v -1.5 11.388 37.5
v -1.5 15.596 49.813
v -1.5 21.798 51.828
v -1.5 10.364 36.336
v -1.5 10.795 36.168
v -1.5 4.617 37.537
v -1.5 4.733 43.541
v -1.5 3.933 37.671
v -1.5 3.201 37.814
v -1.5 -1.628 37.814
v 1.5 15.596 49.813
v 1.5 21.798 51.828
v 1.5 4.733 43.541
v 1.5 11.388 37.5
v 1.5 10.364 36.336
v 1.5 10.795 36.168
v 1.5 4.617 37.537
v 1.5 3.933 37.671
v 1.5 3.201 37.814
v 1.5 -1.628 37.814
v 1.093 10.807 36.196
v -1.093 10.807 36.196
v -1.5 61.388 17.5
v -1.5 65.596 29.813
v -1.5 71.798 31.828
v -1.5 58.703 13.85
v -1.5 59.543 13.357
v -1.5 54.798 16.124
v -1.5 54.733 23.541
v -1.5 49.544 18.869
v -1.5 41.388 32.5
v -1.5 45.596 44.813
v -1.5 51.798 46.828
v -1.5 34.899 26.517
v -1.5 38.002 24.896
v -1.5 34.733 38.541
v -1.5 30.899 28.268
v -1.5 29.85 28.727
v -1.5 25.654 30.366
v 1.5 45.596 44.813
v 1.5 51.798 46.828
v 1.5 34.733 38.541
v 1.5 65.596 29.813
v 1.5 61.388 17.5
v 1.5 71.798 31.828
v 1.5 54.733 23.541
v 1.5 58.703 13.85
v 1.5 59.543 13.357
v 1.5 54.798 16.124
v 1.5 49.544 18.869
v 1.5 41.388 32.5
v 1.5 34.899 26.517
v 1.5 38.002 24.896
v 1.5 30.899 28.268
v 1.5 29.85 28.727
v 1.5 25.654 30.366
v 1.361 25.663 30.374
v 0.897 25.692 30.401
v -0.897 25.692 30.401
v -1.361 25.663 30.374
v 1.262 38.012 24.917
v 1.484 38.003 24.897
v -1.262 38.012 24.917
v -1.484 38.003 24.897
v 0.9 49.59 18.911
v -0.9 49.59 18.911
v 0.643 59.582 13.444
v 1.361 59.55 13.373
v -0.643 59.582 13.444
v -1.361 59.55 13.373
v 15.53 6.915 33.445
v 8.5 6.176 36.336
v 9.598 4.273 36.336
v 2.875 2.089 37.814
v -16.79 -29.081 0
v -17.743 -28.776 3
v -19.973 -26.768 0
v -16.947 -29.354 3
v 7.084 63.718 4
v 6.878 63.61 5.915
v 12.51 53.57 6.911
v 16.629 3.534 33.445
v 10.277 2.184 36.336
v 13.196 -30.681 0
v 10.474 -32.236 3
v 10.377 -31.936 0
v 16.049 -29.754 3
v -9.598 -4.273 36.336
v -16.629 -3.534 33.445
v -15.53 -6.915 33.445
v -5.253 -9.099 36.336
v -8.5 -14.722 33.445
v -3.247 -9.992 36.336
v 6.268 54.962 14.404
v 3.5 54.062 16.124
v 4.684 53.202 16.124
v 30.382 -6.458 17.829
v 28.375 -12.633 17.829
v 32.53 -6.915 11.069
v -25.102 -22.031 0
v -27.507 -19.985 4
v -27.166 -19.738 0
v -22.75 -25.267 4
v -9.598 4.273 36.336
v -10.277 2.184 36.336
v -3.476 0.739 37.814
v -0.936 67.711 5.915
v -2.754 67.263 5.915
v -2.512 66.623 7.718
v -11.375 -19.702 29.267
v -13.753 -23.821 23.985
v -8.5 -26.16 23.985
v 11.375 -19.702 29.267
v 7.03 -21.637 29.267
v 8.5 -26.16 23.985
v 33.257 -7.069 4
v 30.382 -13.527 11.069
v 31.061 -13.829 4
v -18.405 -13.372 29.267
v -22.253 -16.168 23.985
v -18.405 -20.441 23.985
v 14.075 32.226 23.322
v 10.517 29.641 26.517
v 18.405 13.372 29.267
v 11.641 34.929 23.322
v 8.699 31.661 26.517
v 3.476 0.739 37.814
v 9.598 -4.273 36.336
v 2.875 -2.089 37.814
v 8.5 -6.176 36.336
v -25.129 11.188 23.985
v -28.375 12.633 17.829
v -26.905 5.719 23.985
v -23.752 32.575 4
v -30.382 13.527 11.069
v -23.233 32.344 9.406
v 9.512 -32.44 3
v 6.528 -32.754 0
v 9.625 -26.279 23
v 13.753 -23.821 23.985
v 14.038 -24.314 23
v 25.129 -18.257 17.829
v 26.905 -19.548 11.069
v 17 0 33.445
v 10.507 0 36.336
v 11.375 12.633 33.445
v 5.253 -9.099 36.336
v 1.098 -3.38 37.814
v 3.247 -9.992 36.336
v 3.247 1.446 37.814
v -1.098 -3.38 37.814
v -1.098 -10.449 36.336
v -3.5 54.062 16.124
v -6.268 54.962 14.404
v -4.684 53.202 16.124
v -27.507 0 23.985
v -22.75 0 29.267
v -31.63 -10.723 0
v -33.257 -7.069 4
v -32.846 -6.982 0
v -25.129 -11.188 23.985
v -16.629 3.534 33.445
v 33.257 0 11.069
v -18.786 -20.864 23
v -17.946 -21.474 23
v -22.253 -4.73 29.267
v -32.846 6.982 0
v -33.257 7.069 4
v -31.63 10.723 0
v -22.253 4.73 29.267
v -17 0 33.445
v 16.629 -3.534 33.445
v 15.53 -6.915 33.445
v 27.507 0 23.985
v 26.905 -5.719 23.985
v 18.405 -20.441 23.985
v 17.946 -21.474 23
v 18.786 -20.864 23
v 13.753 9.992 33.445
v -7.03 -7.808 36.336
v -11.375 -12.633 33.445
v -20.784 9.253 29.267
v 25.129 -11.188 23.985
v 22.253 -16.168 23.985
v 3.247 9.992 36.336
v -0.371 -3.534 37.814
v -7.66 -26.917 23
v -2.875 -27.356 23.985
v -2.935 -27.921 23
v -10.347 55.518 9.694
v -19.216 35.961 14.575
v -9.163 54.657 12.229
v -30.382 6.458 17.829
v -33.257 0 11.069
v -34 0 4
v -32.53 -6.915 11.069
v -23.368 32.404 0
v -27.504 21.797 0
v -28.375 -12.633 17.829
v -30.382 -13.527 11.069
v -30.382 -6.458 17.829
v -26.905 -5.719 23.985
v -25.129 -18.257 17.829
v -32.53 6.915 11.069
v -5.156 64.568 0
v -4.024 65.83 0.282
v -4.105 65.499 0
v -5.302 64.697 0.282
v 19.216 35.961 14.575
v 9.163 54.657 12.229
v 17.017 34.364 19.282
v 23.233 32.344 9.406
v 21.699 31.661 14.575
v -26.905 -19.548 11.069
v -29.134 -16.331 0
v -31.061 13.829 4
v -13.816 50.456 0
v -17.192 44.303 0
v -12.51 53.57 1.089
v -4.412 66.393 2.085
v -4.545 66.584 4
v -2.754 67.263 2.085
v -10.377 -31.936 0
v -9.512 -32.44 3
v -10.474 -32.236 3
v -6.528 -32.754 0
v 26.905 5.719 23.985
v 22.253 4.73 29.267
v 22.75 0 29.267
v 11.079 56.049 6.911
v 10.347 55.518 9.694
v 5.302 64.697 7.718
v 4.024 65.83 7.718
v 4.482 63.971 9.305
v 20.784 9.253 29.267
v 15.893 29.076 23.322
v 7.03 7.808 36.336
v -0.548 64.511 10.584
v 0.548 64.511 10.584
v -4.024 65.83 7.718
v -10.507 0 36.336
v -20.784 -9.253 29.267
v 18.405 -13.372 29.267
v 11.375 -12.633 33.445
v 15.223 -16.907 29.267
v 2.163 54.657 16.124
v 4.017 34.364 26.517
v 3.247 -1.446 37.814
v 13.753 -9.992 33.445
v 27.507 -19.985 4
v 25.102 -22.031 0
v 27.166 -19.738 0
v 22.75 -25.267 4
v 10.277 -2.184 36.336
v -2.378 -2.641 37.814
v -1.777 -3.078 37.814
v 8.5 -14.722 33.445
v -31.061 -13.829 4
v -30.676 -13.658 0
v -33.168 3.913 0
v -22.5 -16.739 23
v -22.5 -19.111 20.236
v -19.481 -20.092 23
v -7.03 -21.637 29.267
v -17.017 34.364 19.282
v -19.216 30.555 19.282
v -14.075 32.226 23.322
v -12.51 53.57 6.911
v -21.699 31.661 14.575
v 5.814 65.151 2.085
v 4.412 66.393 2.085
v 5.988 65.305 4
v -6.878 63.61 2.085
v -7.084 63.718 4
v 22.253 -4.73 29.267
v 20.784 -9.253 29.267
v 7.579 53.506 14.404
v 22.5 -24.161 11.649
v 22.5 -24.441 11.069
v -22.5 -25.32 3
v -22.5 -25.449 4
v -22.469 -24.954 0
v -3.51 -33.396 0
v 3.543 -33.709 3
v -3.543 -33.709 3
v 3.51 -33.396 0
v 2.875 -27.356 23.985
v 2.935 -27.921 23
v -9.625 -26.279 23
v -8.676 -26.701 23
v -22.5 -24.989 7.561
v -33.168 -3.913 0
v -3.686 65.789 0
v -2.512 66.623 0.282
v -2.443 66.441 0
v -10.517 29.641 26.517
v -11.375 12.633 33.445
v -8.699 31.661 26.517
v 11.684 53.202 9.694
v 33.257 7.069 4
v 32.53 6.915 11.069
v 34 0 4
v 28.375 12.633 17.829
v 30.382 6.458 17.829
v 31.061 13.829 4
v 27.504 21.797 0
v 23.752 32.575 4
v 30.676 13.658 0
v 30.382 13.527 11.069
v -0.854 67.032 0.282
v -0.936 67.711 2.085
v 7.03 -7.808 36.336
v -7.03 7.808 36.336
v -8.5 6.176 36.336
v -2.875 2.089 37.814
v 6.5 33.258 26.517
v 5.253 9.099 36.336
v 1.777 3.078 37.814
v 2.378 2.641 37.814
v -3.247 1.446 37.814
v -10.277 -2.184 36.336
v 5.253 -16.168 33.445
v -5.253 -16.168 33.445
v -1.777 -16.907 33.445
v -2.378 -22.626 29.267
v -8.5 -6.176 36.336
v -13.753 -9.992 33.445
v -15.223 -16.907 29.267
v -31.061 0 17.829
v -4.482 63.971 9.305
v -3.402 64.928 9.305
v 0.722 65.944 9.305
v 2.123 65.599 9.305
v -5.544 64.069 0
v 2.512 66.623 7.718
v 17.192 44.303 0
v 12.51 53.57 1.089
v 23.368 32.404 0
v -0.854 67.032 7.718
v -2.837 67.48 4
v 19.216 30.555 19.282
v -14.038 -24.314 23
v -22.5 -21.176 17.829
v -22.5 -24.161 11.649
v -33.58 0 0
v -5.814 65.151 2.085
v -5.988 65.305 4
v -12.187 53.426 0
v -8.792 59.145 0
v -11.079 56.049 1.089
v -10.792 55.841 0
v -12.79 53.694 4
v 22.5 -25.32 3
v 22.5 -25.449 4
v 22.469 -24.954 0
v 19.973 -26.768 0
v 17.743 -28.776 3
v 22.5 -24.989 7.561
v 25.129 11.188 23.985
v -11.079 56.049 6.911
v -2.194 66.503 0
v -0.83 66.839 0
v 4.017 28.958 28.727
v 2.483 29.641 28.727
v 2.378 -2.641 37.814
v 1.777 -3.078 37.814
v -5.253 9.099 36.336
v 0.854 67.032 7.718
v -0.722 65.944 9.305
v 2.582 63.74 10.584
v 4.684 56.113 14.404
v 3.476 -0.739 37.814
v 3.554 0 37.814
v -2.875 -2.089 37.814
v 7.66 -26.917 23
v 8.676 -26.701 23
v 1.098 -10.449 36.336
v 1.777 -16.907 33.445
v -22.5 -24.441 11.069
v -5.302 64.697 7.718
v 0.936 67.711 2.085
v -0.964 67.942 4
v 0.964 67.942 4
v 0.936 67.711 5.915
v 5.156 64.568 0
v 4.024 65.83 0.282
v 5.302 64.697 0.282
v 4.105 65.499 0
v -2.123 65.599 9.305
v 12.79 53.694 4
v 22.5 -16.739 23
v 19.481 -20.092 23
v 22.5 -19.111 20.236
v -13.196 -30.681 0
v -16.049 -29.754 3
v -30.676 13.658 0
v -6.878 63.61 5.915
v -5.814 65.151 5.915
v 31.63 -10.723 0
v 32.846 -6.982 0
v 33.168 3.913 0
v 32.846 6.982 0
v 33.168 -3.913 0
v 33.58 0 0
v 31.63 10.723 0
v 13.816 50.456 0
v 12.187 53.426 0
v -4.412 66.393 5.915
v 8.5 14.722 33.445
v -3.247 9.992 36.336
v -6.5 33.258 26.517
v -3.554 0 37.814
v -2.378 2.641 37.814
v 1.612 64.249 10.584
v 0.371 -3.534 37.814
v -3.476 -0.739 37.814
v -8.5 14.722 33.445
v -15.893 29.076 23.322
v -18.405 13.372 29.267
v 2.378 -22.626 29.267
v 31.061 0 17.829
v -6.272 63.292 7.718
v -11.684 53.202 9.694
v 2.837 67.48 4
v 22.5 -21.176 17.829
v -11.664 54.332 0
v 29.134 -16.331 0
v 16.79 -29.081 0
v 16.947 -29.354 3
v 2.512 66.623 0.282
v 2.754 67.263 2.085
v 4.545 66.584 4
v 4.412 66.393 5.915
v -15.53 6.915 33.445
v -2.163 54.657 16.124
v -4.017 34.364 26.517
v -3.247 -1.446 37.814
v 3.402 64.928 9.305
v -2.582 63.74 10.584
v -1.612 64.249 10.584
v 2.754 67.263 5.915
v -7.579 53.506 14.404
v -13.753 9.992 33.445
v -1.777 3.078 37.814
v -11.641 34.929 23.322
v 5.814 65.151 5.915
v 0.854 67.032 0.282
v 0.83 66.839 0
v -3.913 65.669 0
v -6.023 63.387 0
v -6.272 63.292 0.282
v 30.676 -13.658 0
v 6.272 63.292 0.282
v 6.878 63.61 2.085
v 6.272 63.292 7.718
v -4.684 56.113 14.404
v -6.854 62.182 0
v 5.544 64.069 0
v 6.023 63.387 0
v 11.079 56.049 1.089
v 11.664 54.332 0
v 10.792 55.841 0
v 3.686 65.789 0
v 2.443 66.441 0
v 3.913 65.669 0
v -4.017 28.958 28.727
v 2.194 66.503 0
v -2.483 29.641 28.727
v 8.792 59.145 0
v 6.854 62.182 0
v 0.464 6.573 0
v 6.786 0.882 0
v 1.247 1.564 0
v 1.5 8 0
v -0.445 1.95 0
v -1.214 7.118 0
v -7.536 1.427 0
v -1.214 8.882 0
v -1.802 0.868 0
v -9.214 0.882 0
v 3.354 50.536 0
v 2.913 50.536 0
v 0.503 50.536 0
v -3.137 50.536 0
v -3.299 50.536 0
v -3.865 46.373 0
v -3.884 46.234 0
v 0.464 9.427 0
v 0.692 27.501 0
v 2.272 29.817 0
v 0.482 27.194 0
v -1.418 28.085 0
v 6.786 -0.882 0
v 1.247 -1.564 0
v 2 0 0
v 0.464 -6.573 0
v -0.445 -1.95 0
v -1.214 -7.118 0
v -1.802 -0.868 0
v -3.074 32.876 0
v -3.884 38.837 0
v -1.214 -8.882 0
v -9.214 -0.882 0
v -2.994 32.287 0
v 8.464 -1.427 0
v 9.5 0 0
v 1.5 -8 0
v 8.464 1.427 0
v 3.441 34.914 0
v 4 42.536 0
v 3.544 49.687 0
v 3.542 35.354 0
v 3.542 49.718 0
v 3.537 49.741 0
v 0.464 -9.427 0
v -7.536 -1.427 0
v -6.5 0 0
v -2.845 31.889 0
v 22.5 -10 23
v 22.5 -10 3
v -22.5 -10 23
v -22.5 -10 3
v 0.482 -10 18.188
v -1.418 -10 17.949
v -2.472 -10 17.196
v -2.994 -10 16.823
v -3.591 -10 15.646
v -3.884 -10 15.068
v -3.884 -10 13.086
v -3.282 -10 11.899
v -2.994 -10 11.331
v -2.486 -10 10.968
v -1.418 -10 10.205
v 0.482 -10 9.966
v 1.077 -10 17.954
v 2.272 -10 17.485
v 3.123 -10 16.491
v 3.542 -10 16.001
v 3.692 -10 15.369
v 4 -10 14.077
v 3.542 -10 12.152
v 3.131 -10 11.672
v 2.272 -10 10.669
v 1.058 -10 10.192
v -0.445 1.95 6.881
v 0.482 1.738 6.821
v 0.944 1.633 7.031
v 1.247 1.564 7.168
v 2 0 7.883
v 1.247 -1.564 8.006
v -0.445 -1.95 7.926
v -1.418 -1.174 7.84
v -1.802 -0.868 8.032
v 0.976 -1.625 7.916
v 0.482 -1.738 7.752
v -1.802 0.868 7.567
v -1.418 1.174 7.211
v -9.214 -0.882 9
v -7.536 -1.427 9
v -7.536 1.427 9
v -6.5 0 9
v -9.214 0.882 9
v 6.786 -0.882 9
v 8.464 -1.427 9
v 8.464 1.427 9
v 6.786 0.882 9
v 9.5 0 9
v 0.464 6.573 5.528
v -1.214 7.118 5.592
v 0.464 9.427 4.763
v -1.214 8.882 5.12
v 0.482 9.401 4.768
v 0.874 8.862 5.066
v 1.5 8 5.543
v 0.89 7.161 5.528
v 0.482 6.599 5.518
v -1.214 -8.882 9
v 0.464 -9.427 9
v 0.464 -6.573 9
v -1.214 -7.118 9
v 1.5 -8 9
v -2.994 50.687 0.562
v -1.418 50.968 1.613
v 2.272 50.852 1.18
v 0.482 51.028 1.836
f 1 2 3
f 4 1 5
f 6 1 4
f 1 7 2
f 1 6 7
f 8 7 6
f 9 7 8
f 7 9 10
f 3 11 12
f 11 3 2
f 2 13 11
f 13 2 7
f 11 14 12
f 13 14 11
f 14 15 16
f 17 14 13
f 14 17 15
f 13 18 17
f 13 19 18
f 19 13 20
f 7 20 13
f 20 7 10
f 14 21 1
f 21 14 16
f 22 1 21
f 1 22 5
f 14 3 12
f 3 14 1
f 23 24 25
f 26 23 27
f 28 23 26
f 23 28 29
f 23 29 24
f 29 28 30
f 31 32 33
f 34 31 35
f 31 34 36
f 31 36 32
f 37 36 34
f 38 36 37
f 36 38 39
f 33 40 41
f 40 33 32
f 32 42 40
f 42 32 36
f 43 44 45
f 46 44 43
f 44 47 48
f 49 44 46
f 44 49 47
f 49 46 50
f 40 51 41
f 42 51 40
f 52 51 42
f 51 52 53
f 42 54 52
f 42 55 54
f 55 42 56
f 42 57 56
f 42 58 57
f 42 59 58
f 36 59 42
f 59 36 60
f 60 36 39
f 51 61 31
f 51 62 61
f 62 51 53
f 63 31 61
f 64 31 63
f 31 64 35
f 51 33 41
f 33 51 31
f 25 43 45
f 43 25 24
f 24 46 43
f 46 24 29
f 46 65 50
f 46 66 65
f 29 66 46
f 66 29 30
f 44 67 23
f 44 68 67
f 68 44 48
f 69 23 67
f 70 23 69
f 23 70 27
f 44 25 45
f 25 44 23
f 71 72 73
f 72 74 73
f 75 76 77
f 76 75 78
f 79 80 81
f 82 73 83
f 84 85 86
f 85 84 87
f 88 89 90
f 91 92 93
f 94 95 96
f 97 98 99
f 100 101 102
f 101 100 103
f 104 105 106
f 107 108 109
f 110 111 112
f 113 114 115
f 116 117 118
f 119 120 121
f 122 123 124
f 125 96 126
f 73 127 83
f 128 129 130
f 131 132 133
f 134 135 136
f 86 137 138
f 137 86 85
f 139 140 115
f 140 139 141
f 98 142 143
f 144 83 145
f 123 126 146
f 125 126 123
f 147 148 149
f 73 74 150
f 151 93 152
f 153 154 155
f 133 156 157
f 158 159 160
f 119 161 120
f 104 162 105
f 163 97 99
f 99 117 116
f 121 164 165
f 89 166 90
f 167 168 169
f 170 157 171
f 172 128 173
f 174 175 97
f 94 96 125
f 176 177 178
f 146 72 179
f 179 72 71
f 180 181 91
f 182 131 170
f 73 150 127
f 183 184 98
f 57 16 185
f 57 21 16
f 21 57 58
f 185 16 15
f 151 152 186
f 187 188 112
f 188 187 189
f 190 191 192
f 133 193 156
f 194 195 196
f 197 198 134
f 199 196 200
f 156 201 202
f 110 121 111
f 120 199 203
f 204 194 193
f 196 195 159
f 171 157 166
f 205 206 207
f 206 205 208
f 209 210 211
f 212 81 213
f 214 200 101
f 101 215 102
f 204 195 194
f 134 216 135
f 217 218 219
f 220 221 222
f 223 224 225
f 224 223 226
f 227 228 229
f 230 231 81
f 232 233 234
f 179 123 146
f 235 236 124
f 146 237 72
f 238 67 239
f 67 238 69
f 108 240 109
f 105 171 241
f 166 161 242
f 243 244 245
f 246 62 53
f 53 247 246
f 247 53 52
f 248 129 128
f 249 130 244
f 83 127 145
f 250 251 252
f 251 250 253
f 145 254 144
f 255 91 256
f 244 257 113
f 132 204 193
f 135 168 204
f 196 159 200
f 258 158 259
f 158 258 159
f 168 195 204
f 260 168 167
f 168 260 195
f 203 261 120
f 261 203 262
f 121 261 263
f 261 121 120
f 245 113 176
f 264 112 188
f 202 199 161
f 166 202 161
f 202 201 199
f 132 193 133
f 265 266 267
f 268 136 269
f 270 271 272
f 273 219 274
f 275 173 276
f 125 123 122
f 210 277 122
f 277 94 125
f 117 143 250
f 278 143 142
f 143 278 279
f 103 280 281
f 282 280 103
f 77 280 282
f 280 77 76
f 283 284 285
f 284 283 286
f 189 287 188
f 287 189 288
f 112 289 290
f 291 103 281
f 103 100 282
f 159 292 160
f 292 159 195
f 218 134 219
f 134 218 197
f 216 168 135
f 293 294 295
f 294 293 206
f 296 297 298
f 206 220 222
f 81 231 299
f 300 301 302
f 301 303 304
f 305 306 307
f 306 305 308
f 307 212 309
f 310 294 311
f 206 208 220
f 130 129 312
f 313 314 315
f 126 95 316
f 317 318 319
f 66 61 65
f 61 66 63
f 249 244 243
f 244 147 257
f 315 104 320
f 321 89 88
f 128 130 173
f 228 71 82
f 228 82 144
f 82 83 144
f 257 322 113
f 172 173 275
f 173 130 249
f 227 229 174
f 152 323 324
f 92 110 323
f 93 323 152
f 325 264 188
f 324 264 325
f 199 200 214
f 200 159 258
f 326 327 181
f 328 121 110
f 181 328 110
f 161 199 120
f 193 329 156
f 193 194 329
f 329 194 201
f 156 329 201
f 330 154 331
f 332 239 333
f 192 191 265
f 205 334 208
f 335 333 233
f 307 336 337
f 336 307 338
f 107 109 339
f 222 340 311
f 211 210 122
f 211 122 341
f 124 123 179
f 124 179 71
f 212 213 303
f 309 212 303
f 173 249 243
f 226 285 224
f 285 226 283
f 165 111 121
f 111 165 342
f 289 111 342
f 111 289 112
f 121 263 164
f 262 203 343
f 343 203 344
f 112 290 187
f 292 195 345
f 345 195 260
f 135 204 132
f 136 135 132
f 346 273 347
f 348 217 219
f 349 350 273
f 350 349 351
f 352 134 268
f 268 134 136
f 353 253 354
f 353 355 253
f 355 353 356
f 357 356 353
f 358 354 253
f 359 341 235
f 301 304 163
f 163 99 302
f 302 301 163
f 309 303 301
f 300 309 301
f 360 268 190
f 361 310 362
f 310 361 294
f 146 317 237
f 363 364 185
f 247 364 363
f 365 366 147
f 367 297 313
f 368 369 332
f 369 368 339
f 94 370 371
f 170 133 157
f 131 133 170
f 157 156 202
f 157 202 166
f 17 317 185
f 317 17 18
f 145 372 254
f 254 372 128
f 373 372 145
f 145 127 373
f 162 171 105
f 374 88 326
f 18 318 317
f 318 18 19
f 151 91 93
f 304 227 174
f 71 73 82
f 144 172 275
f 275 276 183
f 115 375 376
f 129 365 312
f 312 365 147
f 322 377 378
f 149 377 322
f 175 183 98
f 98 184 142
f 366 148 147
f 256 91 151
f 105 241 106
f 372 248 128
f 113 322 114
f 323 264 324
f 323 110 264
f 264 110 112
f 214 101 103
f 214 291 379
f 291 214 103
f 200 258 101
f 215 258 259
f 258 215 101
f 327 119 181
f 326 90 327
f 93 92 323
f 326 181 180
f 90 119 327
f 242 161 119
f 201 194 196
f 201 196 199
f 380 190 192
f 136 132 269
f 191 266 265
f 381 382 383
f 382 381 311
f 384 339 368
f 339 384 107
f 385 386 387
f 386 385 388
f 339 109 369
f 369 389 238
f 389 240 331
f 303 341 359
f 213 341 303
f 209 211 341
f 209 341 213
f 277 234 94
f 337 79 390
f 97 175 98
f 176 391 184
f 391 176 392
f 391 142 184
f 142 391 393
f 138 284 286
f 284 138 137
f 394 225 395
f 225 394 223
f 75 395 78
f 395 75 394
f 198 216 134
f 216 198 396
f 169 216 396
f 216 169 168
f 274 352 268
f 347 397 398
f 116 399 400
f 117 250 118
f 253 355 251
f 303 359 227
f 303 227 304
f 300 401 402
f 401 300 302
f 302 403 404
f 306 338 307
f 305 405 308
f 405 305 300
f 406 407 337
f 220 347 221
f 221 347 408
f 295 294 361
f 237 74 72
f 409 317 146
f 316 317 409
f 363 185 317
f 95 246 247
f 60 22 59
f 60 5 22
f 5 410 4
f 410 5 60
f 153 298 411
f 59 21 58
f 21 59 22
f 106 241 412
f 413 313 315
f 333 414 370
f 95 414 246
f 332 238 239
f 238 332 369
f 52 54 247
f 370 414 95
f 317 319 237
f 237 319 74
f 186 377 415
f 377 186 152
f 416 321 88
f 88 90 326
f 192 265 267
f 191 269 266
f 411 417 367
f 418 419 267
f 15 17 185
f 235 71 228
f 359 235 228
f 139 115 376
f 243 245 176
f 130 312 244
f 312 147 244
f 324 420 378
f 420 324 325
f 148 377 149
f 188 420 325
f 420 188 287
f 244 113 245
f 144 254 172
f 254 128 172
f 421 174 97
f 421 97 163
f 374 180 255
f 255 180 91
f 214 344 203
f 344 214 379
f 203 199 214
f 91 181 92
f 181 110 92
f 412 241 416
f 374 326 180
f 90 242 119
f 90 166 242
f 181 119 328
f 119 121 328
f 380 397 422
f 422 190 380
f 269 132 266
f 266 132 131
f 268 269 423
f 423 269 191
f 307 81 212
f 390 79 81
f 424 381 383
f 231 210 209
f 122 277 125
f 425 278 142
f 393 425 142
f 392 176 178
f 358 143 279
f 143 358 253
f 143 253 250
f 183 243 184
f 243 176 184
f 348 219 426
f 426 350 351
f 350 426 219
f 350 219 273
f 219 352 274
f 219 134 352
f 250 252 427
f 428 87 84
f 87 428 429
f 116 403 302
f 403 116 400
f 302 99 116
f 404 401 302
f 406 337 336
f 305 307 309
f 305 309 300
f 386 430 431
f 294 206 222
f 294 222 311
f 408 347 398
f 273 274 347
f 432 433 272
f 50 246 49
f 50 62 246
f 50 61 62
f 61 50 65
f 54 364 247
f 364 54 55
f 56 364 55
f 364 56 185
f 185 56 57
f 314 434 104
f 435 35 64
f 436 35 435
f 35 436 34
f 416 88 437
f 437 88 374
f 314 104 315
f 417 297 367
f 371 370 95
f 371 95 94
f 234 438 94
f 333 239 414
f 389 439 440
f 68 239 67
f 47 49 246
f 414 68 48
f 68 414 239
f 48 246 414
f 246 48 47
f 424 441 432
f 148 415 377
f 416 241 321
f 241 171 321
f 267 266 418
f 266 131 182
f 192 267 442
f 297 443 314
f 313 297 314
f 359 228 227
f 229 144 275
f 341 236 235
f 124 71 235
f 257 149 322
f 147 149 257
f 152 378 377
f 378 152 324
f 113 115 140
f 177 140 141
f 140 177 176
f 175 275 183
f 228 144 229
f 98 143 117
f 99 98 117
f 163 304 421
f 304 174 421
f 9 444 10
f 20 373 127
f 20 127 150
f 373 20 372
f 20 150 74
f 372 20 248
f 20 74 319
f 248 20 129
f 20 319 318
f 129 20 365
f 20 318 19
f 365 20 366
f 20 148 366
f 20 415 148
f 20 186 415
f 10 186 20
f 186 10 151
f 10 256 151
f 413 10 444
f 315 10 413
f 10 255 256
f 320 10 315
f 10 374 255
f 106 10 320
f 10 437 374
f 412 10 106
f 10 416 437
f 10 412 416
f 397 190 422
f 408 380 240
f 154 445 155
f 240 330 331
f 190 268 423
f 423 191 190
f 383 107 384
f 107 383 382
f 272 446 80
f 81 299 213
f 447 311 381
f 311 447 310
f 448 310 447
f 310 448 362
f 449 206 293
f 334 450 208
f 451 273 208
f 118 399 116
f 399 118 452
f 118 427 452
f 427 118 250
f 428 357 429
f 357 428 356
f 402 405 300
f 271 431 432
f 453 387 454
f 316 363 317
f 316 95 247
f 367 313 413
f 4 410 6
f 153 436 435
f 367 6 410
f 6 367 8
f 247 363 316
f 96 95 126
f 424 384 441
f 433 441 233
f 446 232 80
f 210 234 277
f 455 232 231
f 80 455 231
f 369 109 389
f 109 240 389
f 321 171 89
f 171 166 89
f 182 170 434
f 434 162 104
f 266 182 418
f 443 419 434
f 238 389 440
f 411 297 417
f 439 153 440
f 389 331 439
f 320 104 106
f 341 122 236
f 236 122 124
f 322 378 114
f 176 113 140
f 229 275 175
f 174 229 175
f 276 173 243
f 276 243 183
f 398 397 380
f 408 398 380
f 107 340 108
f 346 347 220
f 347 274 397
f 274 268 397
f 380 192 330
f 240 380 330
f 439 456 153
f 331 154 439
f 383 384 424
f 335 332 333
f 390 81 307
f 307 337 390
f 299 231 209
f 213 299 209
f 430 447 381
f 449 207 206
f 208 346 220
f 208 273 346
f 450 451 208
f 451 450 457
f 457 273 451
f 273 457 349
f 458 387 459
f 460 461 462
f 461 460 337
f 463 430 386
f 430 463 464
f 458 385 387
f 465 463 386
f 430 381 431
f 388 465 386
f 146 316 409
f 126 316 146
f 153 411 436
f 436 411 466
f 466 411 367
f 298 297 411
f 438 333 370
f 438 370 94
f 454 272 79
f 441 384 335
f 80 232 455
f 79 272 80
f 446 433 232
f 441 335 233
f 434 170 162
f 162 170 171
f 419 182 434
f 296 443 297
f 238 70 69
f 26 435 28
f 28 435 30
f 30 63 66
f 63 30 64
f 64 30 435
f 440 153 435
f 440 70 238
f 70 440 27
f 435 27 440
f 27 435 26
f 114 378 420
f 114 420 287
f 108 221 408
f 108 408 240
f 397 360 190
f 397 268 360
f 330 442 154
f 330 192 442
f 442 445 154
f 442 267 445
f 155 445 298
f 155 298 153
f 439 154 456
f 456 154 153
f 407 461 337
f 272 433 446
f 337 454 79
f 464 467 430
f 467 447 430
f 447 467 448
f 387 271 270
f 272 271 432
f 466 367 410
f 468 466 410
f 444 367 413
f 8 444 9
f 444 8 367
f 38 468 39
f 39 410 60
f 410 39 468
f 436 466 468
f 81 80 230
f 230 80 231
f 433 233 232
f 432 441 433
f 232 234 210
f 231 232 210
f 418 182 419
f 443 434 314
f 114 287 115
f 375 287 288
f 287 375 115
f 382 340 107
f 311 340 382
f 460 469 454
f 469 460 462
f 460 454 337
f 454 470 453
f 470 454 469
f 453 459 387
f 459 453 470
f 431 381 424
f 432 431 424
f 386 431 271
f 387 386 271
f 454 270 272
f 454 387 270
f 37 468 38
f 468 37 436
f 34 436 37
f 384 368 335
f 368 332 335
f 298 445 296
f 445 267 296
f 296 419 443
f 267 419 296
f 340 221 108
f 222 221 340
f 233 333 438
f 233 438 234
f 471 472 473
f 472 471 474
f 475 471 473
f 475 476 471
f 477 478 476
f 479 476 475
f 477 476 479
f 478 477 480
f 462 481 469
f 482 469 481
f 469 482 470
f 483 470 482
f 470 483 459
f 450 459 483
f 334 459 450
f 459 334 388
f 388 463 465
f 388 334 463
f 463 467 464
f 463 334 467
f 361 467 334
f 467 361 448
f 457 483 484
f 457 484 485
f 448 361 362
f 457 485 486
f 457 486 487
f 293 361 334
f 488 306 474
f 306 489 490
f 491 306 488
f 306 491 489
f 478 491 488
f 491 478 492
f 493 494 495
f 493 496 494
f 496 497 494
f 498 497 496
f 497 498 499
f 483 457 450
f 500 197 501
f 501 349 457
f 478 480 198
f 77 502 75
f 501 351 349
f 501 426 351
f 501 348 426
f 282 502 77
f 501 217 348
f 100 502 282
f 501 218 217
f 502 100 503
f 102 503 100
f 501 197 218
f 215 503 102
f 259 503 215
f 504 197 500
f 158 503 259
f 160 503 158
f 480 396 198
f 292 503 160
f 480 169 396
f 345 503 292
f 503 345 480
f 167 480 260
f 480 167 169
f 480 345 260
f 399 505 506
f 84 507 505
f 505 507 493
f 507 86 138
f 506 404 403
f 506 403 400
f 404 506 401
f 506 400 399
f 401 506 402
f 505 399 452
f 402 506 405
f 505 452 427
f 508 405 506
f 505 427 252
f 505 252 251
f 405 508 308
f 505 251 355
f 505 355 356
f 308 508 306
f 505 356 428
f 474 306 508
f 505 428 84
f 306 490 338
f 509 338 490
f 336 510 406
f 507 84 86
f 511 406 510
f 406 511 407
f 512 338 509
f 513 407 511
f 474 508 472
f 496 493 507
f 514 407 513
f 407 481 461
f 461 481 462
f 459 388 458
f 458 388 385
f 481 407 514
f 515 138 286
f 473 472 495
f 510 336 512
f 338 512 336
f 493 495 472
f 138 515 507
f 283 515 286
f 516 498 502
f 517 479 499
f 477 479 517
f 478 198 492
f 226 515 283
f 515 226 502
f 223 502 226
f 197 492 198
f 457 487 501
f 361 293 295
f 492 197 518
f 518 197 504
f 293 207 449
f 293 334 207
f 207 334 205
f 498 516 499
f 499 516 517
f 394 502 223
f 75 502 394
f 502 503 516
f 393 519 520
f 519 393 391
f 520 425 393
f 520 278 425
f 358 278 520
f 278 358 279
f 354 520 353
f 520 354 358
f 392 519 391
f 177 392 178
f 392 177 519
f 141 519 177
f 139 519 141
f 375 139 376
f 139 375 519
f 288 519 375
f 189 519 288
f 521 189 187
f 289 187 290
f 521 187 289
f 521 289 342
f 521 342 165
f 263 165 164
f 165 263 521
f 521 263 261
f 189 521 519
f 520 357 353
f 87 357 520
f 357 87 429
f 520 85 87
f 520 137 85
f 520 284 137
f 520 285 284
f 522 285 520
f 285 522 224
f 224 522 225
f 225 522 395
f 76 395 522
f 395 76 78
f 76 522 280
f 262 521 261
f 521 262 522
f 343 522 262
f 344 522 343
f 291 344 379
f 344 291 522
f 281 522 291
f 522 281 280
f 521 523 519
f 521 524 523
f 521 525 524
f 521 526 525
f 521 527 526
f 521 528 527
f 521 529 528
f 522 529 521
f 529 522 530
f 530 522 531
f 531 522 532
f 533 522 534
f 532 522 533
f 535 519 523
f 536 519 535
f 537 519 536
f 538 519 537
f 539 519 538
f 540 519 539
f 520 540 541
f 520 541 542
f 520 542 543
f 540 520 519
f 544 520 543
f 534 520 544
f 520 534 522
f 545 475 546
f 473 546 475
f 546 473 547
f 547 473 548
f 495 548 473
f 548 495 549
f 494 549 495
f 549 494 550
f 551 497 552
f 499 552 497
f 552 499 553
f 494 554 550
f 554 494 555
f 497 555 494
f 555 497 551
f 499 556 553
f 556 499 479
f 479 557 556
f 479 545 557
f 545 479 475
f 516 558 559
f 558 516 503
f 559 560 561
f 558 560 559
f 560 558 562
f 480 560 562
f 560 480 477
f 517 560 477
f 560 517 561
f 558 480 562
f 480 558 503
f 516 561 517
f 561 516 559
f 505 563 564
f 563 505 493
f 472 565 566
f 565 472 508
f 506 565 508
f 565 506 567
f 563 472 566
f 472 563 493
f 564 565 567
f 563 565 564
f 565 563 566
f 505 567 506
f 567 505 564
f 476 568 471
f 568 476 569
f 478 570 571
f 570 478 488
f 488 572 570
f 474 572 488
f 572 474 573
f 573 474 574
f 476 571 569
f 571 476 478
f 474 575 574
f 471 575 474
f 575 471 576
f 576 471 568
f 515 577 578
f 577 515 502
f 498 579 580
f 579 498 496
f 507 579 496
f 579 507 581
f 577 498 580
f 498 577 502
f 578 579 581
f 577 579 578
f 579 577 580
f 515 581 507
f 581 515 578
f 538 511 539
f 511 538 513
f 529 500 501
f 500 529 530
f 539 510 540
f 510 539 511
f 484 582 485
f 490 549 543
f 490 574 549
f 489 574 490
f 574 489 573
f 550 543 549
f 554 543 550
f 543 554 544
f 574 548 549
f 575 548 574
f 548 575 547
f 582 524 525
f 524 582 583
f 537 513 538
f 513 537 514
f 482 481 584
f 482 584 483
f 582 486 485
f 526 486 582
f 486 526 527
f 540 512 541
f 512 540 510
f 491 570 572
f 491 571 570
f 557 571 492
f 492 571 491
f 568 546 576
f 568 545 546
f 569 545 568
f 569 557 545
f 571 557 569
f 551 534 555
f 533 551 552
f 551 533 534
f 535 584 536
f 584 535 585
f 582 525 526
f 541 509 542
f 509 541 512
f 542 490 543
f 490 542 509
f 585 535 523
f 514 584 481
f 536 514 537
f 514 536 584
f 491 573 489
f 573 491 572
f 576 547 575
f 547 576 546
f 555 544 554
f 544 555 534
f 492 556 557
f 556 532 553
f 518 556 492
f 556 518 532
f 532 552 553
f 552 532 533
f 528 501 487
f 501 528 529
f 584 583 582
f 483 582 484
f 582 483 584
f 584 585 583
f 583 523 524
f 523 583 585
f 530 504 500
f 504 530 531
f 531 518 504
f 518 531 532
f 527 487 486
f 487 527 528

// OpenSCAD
module pico(){
difference(){
rotate([0,90,0])translate([0,0,0])cylinder(r=60,h=3);
translate([0,45,0])rotate([0,90,0])translate([0,0,-1])cylinder(r=85,h=5);
}

module ok(){

	translate([0,-5,0])cylinder(r=1,h=60);
	translate([0,5,0])cylinder(r=1,h=60);
}

}

difference(){
union(){
translate([0,0,4])hull(){

	sphere(r=34);
	translate([0,22,0])sphere(r=26);
	translate([0,24,0])sphere(r=22);
	translate([0,28,0])sphere(r=12);
	translate([0,32,0])sphere(r=16);
	translate([0,48,0])sphere(r=14);
	//%translate([0,33,0])sphere(r=10);
	translate([0,60,0])sphere(r=8);

}
translate([-1.5,40,-5])pico();
translate([-1.5,70,-10])pico();
translate([-1.5,90,-25])pico();
}
translate([0,0,-300])cube(600, center=true);

translate([-45/2,-60,3])cube([45,50,20]);


translate([0,0,-1])cylinder(r=2,h=10);

translate([-8,0,-1])cylinder(r=1.5,h=10);
translate([8,0,-1])cylinder(r=1.5,h=10);
translate([0,8,-1])cylinder(r=1.5,h=10);
translate([0,-8,-1])cylinder(r=1.5,h=10);
translate([0,50,-2])rotate([75,0,0])cylinder(r=4,h=190);

}
